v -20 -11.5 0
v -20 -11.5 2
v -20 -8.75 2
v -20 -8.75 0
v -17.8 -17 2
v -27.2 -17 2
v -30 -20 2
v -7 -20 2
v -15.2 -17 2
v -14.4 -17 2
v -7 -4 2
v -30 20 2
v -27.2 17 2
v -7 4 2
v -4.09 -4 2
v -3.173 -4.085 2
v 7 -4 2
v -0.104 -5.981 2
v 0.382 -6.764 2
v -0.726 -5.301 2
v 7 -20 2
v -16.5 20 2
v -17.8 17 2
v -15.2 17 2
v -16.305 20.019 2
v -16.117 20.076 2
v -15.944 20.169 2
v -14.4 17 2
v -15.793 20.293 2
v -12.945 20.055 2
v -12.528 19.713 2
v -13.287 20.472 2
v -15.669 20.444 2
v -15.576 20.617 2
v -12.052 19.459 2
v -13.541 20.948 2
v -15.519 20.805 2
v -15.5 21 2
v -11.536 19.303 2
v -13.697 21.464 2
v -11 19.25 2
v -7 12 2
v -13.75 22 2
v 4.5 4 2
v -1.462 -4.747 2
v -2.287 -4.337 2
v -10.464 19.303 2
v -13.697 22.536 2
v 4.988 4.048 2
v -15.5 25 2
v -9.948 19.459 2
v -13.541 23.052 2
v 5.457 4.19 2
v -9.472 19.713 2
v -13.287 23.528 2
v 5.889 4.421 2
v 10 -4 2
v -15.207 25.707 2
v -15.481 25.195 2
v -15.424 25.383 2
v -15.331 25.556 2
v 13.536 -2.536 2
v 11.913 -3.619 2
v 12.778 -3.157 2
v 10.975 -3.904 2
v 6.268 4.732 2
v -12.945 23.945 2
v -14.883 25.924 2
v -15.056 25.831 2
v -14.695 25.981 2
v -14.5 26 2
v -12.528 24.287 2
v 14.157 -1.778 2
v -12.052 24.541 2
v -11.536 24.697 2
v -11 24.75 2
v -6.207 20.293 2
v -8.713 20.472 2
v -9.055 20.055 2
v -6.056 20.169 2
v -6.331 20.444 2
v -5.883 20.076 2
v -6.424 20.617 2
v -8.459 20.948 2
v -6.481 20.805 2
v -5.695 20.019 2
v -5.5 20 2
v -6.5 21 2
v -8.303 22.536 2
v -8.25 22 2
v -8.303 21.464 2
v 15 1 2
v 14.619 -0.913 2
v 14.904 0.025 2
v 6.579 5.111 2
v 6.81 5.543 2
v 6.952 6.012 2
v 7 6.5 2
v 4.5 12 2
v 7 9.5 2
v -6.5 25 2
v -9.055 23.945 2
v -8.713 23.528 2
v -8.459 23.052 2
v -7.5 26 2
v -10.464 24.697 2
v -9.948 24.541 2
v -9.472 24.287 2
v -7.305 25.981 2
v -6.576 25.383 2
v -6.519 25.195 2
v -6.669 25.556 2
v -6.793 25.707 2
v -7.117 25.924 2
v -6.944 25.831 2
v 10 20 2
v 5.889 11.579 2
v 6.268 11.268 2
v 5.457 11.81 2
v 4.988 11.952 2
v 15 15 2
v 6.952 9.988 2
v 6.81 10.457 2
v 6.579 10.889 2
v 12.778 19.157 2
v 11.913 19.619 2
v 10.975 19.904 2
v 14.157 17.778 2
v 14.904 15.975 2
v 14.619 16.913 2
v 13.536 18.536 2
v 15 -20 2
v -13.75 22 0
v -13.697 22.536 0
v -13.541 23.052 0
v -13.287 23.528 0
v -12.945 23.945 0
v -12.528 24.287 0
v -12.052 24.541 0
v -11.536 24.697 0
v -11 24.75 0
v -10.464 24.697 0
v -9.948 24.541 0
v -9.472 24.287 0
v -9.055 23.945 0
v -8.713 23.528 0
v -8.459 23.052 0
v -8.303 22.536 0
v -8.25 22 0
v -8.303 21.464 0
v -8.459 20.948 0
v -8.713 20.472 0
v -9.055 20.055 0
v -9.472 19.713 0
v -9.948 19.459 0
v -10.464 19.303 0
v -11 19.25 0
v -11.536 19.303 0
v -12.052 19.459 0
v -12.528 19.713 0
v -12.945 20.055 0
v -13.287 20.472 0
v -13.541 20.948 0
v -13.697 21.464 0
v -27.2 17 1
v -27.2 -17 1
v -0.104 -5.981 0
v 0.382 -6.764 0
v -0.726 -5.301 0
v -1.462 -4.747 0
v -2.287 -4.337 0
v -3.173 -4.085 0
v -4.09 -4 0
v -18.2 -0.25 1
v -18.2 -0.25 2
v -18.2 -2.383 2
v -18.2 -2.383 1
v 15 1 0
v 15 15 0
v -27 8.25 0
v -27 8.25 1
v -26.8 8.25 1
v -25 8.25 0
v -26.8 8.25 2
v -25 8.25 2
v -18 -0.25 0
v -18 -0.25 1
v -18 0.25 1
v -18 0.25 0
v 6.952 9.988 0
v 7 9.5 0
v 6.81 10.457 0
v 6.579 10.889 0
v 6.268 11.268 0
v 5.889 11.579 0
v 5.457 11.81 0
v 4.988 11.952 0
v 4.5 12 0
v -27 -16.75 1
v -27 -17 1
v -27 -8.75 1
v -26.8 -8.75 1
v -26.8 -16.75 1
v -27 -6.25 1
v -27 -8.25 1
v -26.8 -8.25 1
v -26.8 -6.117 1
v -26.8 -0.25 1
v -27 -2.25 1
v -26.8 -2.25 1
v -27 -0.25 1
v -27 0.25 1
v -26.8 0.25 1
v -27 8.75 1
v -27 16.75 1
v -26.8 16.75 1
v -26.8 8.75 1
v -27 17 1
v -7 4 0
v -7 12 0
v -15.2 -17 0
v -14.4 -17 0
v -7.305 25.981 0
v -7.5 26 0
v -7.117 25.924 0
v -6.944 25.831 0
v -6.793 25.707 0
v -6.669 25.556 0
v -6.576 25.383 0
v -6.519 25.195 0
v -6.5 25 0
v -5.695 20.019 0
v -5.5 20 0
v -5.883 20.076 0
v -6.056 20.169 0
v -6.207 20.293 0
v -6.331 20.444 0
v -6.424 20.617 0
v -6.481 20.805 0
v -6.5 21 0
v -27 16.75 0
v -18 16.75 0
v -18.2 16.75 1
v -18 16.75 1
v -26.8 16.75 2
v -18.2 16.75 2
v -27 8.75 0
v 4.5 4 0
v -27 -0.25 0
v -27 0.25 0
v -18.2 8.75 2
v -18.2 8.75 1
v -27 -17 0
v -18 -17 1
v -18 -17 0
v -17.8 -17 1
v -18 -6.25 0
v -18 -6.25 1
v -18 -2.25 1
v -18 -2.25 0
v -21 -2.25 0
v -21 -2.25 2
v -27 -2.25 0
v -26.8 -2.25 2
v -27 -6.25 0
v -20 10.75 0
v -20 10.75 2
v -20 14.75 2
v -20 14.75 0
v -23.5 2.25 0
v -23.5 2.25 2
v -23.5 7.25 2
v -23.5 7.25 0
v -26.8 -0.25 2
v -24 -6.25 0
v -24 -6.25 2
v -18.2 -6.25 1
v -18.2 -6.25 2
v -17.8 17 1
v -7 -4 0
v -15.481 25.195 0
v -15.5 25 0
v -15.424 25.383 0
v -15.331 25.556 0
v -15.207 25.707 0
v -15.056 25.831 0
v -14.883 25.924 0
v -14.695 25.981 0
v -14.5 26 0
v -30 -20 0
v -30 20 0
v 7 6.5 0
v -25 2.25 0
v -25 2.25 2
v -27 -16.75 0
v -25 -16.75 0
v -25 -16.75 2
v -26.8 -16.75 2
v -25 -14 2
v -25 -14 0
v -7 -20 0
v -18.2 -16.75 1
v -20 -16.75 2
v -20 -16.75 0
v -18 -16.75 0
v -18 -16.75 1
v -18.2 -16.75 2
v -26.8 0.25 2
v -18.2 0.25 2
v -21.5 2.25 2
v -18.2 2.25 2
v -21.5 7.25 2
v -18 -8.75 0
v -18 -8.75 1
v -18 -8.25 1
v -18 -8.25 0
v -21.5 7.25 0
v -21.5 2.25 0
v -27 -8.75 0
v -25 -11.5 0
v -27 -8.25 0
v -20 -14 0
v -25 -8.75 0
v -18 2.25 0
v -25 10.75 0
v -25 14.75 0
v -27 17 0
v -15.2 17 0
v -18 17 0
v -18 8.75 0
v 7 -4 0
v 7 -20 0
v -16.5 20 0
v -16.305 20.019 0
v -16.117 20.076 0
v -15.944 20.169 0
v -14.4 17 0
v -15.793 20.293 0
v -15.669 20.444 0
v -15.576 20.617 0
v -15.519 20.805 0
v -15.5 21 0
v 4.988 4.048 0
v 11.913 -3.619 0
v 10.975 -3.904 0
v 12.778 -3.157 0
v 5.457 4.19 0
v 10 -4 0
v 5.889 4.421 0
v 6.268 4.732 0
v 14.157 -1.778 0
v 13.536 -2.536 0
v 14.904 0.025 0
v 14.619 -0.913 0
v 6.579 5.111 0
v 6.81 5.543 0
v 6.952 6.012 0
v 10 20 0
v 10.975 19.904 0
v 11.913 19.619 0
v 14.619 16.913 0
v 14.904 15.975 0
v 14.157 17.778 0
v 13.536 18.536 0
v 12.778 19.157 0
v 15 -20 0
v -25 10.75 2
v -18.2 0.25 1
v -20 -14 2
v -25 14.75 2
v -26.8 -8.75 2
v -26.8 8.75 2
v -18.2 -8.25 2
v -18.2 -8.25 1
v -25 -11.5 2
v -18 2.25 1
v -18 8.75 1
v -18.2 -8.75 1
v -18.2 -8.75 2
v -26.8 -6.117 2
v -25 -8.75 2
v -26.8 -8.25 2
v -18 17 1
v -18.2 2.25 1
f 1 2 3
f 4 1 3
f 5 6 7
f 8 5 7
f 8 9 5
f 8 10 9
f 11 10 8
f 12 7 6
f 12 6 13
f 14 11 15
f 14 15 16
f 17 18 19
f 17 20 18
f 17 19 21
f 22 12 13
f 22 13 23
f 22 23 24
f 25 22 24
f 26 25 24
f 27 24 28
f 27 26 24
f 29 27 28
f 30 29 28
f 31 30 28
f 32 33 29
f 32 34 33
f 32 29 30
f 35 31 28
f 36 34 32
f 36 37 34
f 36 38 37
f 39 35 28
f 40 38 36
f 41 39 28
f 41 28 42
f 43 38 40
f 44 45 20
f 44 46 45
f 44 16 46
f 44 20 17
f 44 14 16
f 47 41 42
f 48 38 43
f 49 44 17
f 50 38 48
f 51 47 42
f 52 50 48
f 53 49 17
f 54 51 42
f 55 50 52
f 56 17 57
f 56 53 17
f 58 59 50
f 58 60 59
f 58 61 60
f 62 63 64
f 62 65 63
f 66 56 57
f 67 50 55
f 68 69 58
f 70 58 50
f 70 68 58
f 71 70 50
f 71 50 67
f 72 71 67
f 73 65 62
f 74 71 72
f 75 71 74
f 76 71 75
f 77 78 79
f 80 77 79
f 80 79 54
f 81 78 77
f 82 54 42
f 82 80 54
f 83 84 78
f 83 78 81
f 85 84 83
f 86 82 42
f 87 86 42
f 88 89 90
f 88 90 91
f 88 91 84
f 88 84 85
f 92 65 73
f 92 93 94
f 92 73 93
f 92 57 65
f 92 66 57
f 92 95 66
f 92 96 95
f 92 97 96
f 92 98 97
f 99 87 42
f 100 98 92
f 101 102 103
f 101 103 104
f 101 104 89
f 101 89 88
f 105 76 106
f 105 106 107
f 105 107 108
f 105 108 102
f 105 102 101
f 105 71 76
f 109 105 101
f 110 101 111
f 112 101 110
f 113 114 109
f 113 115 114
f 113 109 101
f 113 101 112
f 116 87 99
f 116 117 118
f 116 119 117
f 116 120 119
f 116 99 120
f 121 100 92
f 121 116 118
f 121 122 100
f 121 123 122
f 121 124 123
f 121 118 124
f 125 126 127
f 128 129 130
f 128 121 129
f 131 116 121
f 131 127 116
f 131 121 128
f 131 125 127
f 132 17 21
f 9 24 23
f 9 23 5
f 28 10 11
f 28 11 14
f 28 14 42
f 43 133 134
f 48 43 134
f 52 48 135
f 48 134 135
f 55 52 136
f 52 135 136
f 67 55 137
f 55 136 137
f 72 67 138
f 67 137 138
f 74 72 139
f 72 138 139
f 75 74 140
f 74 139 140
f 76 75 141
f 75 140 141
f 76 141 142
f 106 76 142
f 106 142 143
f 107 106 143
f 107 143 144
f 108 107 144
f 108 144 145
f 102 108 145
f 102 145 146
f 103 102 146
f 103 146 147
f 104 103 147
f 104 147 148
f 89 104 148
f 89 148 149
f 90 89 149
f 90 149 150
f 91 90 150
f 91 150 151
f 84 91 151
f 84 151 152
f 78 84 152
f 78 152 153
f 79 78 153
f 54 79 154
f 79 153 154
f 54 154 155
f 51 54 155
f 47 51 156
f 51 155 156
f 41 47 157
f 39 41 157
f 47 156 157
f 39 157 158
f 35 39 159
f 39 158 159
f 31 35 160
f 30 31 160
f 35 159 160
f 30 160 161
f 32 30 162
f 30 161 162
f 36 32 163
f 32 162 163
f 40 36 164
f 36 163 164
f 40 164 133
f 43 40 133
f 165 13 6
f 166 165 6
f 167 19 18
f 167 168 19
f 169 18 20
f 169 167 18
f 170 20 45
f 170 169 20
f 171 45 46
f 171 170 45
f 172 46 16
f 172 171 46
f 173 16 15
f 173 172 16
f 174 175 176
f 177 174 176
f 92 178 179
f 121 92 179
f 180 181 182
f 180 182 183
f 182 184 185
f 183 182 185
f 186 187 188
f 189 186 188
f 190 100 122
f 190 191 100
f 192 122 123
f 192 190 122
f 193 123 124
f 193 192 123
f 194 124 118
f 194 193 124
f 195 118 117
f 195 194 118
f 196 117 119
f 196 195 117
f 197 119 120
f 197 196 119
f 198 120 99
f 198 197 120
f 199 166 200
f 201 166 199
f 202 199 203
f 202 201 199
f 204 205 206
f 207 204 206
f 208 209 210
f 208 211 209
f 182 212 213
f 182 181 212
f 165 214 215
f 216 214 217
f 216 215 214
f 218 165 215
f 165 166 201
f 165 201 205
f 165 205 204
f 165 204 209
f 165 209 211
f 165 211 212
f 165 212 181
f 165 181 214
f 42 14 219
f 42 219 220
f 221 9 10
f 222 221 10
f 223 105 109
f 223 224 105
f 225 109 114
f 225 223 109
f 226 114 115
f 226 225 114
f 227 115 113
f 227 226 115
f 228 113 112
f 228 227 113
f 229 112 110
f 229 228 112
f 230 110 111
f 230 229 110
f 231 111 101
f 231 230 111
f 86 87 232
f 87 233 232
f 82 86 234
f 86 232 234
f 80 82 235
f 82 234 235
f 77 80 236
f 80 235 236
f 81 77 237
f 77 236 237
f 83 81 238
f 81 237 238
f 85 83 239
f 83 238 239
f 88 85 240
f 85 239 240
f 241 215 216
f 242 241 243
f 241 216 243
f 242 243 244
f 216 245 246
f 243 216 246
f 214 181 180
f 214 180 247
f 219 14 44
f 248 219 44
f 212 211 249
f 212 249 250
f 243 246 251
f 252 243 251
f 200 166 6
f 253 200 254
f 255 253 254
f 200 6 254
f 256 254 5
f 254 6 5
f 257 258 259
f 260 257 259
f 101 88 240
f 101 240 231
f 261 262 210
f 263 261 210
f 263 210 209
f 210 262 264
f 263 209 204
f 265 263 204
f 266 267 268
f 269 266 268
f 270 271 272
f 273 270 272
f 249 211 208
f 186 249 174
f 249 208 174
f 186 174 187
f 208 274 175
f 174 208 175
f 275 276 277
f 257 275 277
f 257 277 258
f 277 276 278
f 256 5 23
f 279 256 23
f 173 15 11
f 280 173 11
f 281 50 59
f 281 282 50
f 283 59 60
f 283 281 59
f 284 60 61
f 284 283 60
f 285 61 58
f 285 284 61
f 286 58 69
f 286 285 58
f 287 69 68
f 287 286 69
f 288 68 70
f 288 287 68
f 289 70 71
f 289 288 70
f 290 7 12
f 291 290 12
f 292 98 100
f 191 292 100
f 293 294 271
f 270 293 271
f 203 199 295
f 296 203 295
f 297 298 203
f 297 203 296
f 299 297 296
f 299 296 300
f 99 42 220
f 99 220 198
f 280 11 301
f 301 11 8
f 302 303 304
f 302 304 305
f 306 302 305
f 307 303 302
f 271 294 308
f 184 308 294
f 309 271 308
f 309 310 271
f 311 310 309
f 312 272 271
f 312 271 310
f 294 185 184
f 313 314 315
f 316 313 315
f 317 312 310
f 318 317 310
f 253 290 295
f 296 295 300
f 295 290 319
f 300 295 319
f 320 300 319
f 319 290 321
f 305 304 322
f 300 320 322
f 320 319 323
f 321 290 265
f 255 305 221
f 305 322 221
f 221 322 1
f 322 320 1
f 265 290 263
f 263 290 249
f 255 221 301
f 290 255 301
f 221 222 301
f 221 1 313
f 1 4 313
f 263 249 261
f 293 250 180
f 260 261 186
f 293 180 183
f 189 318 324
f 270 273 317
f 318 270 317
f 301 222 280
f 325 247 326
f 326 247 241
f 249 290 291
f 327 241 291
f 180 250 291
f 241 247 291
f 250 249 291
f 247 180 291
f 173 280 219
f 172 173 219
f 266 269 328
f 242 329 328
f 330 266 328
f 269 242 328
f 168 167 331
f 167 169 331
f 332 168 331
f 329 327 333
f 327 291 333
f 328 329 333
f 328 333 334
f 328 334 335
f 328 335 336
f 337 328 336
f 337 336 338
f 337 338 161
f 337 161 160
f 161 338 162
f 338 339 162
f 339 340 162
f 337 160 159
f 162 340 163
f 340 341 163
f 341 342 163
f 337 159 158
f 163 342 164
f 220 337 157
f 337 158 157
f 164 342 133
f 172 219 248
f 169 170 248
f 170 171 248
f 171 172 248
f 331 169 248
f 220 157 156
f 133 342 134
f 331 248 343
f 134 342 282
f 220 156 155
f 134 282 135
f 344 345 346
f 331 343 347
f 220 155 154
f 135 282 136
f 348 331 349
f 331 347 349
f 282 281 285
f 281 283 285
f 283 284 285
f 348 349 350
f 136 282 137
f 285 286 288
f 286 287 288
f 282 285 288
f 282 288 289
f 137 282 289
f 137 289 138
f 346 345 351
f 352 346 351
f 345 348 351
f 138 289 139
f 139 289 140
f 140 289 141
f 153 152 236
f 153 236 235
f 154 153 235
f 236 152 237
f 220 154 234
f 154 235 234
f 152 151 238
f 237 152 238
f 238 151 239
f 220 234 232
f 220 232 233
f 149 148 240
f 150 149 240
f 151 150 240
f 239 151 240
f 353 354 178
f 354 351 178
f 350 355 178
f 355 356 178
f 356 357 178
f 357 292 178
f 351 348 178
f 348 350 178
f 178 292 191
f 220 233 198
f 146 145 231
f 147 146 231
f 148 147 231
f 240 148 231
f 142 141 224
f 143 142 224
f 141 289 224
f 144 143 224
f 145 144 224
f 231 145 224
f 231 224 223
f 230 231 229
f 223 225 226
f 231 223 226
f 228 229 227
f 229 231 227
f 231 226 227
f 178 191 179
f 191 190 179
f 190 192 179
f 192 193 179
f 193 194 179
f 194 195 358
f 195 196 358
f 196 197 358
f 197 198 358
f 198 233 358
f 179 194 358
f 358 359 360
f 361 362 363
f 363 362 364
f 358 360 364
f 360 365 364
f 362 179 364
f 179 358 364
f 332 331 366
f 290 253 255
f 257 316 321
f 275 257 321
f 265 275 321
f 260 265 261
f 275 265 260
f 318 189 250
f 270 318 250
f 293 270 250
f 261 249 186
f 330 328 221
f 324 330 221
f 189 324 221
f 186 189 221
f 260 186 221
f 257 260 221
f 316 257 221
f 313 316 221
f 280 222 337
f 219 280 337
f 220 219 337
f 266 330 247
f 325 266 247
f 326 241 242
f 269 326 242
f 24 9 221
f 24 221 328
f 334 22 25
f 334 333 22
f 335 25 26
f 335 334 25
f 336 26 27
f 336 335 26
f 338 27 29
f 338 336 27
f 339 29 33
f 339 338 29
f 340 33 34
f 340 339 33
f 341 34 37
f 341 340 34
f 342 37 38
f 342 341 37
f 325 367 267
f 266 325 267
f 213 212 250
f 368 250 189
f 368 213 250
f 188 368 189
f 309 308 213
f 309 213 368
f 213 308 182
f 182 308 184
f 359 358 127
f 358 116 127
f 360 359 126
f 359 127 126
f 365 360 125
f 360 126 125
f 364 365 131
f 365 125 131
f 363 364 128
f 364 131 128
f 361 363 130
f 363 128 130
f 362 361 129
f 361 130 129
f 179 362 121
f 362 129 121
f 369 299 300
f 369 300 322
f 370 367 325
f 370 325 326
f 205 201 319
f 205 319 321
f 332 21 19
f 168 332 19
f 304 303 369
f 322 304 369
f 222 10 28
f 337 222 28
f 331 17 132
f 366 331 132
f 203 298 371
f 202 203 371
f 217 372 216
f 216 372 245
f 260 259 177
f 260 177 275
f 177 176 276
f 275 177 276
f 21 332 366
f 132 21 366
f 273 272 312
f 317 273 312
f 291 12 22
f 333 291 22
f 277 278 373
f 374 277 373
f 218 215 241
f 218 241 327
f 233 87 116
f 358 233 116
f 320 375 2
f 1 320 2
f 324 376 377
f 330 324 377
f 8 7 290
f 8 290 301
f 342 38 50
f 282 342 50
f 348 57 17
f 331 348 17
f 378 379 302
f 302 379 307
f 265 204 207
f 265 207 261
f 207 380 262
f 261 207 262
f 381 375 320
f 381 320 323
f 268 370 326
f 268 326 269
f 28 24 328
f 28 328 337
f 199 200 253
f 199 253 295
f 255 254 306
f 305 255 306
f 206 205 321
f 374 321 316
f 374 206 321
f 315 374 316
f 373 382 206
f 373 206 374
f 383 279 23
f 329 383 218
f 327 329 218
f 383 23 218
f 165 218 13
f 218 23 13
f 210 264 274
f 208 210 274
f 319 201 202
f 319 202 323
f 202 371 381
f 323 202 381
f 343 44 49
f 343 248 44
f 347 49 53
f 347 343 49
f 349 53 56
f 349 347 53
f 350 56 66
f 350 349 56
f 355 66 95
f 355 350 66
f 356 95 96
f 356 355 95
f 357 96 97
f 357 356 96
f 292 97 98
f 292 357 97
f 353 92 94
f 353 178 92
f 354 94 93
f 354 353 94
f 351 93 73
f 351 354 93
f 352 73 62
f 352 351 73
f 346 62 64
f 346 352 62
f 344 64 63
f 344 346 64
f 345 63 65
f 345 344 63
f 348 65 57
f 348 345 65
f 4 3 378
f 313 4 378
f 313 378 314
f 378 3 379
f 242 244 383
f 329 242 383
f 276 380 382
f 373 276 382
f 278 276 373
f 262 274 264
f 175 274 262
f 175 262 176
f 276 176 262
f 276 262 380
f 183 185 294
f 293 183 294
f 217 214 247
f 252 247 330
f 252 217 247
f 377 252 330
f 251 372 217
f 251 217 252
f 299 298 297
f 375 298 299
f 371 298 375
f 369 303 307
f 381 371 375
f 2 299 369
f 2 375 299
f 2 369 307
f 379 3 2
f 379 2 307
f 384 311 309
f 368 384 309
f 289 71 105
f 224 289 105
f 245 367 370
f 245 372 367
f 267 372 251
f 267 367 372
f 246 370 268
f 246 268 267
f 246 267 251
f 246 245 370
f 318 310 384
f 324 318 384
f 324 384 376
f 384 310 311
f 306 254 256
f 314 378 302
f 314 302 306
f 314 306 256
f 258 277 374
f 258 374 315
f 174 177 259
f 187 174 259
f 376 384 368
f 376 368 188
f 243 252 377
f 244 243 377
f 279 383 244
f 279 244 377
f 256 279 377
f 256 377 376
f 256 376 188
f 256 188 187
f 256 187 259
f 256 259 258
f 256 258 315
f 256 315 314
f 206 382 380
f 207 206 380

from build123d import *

# Parameters (mm, degrees)
F0_W            = 30
F0_H            = 40
F1_DEPTH        = 2
F2_W            = 14
F2_H            = 8
F3_DEPTH        = 10
F5_DEPTH        = 10
F6_R            = 5
F7_R            = 2.5
F8_W            = 15
F8_H            = 40
F8_W_2          = 9
F8_H_2          = 34
F9_DEPTH        = 2
F10_W           = 0.8
F10_H           = 34
F11_DEPTH       = 10
F12_W           = 9
F12_H           = 8
F13_DEPTH       = 2
F14_W           = 5
F14_H           = 2.75
F14_H_2         = 4
F15_DEPTH       = 10
F17_DEPTH       = 1
F18_W           = 9
F18_H           = 6
F19_DEPTH       = 2
F20_R           = 1
F22_D           = 5.5
F22_CBORE_D     = 6.5
F22_CBORE_DEPTH = 0


with BuildPart() as f1:
    # F0 (on Top) → F1 (new body)
    with BuildSketch(Plane.XY):
        Rectangle(F0_W, F0_H)
    extrude(amount=F1_DEPTH)

    # F2 (on face) → F3 (cut)
    with BuildSketch(Plane.XY.offset(2)):
        with Locations((0, 8)):
            Rectangle(F2_W, F2_H)
    extrude(amount=-F3_DEPTH, mode=Mode.SUBTRACT)

    # F4 (on face) → F5 (cut)
    with BuildSketch(Plane.XY.offset(2)):
        Polygon((-1, -4), (-7, -4), (-7, -20), (7, -20), align=None)
        Polygon((15, -4), (7, -4), (15, -20), align=None)
    extrude(amount=-F5_DEPTH, mode=Mode.SUBTRACT)

    # F6
    f6_edges = [f1.edges().sort_by_distance(p)[0] for p in [
        (15, -4, 1),
        (15, 20, 1),
        (-1, -4, 1),
    ]]
    fillet(f6_edges, radius=F6_R)

    # F7
    f7_edges = [f1.edges().sort_by_distance(p)[0] for p in [
        (7, 12, 1),
        (7, 4, 1),
    ]]
    fillet(f7_edges, radius=F7_R)

    # F8 (on face) → F9 (join)
    with BuildSketch(Plane.XY.offset(2)):
        with Locations((-22.5, 0)):
            Rectangle(F8_W, F8_H)
        with Locations((-22.5, 0)):
            Rectangle(F8_W_2, F8_H_2, mode=Mode.SUBTRACT)
    extrude(amount=-F9_DEPTH)

    # F10 (on face) → F11 (cut)
    with BuildSketch(Plane.XY.offset(2)):
        with Locations((-14.8, 0)):
            Rectangle(F10_W, F10_H)
    extrude(amount=-F11_DEPTH, mode=Mode.SUBTRACT)

    # F12 (on face) → F13 (join)
    with BuildSketch(Plane.XY.offset(2)):
        with Locations((-22.5, -12.75)):
            Rectangle(F12_W, F12_H)
        with Locations((-22.5, -4.25)):
            Rectangle(F12_W, F12_H)
        with Locations((-22.5, 4.25)):
            Rectangle(F12_W, F12_H)
        with Locations((-22.5, 12.75)):
            Rectangle(F12_W, F12_H)
    extrude(amount=-F13_DEPTH)

    # F14 (on face) → F15 (cut)
    with BuildSketch(Plane.XY.offset(2)):
        with Locations((-22.5, -15.375)):
            Rectangle(F14_W, F14_H)
        with Locations((-22.5, -10.125)):
            Rectangle(F14_W, F14_H)
        Polygon((-27, -2.25), (-27, -6.25), (-21, -2.25), align=None)
        Polygon((-23.9995513111, -6.25), (-18, -6.25), (-18, -2.25), align=None)
        Polygon((-21.5, 2.25), (-18, 2.25), (-18, 8.25), (-25, 8.25), (-25, 2.25), (-23.5, 2.25), (-23.5, 7.25), (-21.5, 7.25), align=None)
        with Locations((-22.5, 12.75)):
            Rectangle(F14_W, F14_H_2)
    extrude(amount=-F15_DEPTH, mode=Mode.SUBTRACT)

    # F16 (on face) → F17 (cut)
    with BuildSketch(Plane.XY.offset(2)):
        Polygon((-27.2, 17), (-27.2, -17), (-27, -17), (-27, -16.75), (-26.8, -16.75), (-26.8, -8.75), (-27, -8.75), (-27, -8.25), (-26.8, -8.25), (-26.8, -6.1166666667), (-27, -6.25), (-27, -2.25), (-26.8, -2.25), (-26.8, -0.25), (-27, -0.25), (-27, 0.25), (-26.8, 0.25), (-26.8, 8.25), (-27, 8.25), (-27, 8.75), (-26.8, 8.75), (-26.8, 16.75), (-27, 16.75), (-27, 17), align=None)
        Polygon((-18, -16.75), (-18, -17), (-17.8, -17), (-17.8, 17), (-18, 17), (-18, 16.75), (-18.2, 16.75), (-18.2, 8.75), (-18, 8.75), (-18, 2.25), (-18.2, 2.25), (-18.2, 0.25), (-18, 0.25), (-18, -0.25), (-18.2, -0.25), (-18.2, -2.3833433049), (-18, -2.25), (-18, -6.25), (-18.2, -6.25), (-18.2, -8.25), (-18, -8.25), (-18, -8.75), (-18.2, -8.75), (-18.2, -16.75), align=None)
    extrude(amount=-F17_DEPTH, mode=Mode.SUBTRACT)

    # F18 (on face) → F19 (join)
    with BuildSketch(Plane.XY.offset(2)):
        with Locations((-11, 23)):
            Rectangle(F18_W, F18_H)
    extrude(amount=-F19_DEPTH)

    # F20
    f20_edges = [f1.edges().sort_by_distance(p)[0] for p in [
        (-15.5, 26, 1),
        (-6.5, 26, 1),
        (-6.5, 20, 1),
        (-15.5, 20, 1),
    ]]
    fillet(f20_edges, radius=F20_R)

    # F22 (through all)
    with Locations(Plane.XY.offset(2)):
        with Locations((-11, 22)):
            CounterBoreHole(F22_D / 2, F22_CBORE_D / 2, F22_CBORE_DEPTH)


solid = f1.part
